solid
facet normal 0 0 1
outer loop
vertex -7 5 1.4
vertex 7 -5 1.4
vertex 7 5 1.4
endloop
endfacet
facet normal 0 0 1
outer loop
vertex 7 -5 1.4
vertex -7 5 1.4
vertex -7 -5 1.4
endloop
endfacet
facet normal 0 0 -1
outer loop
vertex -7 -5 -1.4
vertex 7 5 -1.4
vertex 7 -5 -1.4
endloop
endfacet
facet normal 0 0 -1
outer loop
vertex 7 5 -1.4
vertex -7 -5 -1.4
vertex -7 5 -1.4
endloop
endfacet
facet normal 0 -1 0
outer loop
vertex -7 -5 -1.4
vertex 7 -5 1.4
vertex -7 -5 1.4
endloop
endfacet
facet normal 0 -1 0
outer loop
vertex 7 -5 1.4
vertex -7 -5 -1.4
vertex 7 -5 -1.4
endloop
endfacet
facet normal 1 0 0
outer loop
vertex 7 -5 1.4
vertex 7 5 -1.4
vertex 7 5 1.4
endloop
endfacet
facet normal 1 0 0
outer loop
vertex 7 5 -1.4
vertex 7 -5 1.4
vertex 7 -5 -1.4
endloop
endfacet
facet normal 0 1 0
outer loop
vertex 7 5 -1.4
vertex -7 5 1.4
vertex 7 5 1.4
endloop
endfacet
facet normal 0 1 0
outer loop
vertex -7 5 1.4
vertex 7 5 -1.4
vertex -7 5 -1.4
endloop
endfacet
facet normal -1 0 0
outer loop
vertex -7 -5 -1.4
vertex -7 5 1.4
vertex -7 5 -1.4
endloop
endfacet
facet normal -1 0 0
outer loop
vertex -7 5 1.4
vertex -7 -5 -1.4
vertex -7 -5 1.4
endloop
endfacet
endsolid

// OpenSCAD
// Units: millimeters. Print two blue plates and one orange pull.
// PETG, 0.2 mm layers, 40% infill. Blue assembly: two 2.8 mm plates
// plus 0.4 mm compressed tape/bond layer = 6 mm total.
part = "blue_plate";
if (part == "blue_plate") cube([14,10,2.8], center=true);
if (part == "orange_pull") cube([18,16,24], center=true);
if (part == "blue_assembly") {
    for (z=[-1.6,1.6]) translate([0,0,z]) cube([14,10,2.8], center=true);
}
